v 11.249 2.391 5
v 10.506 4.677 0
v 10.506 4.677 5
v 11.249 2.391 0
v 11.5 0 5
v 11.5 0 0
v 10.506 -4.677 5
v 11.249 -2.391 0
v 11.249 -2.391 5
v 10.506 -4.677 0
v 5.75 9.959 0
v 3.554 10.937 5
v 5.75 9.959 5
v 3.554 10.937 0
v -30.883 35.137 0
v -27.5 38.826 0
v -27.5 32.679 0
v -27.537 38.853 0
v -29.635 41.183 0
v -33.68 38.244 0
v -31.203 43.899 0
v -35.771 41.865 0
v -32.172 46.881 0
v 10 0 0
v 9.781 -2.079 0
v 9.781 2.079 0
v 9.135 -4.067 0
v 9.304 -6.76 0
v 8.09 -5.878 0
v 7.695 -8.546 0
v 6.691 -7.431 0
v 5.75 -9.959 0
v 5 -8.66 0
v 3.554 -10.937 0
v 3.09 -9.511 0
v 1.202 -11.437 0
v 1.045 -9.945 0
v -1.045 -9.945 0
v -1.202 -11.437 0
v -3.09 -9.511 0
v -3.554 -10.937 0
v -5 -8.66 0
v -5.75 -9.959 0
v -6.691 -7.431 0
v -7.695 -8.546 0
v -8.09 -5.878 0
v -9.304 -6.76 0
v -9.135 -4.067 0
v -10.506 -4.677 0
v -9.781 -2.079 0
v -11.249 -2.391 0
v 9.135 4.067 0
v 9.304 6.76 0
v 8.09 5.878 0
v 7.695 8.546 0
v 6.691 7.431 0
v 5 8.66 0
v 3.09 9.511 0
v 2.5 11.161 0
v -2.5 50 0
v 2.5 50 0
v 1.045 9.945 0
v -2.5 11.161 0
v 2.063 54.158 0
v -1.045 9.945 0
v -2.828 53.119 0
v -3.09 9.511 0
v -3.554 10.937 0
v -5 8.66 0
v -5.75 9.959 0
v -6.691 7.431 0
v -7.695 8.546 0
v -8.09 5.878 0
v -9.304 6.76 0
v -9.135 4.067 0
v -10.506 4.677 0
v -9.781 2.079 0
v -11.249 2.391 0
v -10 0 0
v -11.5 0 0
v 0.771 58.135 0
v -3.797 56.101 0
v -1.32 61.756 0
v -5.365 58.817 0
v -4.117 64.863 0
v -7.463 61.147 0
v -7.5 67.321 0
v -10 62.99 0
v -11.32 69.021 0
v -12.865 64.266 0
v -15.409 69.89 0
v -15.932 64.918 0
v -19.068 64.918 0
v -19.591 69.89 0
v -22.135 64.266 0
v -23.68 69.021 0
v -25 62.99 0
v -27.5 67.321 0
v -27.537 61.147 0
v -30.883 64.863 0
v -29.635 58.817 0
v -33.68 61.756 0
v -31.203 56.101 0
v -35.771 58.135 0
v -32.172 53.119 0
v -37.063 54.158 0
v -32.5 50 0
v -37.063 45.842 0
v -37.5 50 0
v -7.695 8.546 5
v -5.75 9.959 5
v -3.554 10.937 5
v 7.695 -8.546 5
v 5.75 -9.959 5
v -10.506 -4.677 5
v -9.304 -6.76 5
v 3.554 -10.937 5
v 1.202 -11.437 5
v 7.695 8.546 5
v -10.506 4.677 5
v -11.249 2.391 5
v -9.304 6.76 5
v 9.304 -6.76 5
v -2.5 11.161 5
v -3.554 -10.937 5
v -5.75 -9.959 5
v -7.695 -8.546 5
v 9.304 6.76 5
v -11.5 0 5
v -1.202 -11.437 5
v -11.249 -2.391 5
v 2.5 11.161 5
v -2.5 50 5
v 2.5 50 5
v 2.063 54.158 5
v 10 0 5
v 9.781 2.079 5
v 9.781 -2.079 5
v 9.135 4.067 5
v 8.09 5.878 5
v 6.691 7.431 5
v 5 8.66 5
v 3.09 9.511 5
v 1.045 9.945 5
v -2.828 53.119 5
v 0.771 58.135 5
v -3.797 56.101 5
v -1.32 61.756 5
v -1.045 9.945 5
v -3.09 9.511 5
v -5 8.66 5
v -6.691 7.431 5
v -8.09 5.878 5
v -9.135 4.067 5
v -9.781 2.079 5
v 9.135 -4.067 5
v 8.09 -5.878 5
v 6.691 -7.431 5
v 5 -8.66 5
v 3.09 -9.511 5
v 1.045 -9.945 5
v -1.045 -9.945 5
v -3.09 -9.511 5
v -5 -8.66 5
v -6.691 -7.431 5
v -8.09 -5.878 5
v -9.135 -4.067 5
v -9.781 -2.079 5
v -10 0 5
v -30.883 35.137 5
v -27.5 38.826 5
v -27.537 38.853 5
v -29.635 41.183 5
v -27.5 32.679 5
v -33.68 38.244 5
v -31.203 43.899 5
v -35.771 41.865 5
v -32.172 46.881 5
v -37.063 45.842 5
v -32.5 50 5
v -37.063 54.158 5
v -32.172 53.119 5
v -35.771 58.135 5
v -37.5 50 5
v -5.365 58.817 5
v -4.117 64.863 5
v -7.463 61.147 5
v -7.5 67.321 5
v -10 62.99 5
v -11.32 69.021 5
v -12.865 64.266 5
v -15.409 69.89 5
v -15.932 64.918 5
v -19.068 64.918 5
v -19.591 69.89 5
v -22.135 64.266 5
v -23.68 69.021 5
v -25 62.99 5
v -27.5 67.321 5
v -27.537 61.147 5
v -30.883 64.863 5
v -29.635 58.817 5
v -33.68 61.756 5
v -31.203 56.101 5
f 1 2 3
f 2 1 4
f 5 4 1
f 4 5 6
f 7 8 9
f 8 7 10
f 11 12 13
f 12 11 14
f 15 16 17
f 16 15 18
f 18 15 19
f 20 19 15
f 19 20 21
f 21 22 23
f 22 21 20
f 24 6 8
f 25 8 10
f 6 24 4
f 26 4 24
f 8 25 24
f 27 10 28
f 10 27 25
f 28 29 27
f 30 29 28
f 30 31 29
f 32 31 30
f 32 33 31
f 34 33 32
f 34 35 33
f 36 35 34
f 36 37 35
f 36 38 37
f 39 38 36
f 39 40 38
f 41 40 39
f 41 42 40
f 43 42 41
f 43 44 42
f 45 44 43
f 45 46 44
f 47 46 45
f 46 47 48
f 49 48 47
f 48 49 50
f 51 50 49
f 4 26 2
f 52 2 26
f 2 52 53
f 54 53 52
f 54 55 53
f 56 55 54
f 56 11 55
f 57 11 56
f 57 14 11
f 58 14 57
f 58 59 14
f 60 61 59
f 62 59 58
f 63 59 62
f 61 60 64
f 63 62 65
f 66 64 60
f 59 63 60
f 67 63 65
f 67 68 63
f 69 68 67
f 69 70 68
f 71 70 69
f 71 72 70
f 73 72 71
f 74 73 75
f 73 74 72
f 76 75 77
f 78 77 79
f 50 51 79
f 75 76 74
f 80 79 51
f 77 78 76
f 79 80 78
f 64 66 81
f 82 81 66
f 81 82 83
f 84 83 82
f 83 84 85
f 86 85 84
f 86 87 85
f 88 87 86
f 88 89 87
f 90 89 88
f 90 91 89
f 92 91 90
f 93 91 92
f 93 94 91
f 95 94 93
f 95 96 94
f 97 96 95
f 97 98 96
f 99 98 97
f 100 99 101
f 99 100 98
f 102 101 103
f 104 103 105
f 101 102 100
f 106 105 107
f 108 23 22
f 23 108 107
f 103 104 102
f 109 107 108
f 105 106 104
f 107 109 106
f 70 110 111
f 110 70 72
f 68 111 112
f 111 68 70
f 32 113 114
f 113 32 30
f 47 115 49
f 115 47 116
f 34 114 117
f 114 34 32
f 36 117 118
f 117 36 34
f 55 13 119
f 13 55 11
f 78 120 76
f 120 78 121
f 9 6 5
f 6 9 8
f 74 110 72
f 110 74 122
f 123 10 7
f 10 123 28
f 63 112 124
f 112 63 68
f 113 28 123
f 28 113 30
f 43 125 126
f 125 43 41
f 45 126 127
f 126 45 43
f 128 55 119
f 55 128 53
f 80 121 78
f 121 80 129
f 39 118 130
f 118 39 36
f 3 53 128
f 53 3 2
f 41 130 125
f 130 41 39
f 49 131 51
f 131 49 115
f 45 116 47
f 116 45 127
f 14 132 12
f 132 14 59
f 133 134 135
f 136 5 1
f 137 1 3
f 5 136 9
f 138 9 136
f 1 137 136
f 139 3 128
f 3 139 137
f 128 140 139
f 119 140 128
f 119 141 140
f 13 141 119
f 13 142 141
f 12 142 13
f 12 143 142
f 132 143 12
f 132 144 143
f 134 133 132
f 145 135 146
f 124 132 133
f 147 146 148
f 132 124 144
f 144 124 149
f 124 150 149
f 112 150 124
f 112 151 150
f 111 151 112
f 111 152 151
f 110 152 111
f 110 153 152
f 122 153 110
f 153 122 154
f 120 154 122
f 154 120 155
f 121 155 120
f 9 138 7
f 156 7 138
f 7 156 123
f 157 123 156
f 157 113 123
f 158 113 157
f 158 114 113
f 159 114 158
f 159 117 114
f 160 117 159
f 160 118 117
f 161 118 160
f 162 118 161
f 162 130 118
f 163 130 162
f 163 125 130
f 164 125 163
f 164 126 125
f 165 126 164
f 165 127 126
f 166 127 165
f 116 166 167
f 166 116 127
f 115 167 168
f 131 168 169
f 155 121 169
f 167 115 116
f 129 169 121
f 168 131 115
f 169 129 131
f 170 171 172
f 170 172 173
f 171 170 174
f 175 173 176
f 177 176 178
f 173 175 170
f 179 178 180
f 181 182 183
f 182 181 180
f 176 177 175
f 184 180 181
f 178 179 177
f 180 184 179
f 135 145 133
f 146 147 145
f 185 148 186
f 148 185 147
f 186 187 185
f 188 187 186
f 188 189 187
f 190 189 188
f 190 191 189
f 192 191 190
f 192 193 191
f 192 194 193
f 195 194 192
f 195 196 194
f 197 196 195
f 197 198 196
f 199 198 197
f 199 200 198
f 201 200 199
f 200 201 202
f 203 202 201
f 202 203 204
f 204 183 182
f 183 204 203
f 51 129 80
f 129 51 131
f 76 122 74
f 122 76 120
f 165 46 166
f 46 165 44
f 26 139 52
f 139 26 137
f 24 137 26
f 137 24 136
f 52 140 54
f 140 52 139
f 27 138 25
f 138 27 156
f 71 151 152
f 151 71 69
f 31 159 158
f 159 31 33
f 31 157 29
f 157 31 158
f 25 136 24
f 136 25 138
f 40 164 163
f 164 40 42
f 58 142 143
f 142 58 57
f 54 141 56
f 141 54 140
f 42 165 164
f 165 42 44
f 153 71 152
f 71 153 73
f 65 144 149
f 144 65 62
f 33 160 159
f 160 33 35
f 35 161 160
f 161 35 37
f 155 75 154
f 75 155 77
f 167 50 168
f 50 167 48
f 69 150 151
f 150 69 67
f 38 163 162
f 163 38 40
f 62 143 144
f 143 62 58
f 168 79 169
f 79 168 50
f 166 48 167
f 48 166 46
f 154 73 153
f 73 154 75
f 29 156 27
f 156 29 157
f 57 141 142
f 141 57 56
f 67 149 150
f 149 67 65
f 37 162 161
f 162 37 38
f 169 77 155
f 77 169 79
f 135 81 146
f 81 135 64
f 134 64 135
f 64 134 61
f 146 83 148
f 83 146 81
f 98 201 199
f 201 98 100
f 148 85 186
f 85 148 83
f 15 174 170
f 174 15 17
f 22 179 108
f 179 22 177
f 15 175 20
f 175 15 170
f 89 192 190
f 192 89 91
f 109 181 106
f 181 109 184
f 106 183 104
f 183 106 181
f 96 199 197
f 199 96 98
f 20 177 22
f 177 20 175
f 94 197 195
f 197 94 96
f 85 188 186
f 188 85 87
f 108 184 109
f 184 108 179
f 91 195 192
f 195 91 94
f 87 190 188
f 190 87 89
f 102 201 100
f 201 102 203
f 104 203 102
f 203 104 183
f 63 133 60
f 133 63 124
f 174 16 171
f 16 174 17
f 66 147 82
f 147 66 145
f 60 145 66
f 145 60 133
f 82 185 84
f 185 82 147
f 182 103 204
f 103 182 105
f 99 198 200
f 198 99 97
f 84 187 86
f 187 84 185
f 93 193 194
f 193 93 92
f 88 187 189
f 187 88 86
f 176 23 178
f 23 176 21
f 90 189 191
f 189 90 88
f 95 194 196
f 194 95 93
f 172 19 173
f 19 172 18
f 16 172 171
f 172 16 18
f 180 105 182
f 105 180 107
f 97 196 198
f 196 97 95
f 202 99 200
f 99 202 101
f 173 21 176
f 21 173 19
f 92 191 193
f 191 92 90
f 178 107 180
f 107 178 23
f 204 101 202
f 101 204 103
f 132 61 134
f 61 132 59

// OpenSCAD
height = 5;//[1:20]
keyr_size = 20;//[5:75]
keyr_thick = 3;//[1:70]

thick = 5;//[1:20]
length = 40;//[20:100]
holder_size = 30;//[10:100]
hole_opening = 25;//[10:100]



difference()
{
    cylinder(height,d=keyr_size+keyr_thick,d=keyr_size+keyr_thick);
        translate([0,0,-0.5])
        {
            cylinder(height+1,d=keyr_size,d=keyr_size);
        } 
}



translate([-thick/2,keyr_size/2,0])
{
    cube([thick,length,height]);
}


difference()
{
    difference()
    {
        translate([-holder_size/2-thick/2,length+keyr_size/2,0])
            {
                cylinder(height,d=holder_size+thick*2,d=holder_size+thick*2);
            }
        
        translate([-thick/2-hole_opening,keyr_size/2,-0.5])
            {
                cube([hole_opening,length,height+1]);
            }
    }       
        
    translate([-holder_size/2-thick/2,length+keyr_size/2,-0.5])
    {
        cylinder(height+1,d=holder_size,d=holder_size);
    }   
    
}
